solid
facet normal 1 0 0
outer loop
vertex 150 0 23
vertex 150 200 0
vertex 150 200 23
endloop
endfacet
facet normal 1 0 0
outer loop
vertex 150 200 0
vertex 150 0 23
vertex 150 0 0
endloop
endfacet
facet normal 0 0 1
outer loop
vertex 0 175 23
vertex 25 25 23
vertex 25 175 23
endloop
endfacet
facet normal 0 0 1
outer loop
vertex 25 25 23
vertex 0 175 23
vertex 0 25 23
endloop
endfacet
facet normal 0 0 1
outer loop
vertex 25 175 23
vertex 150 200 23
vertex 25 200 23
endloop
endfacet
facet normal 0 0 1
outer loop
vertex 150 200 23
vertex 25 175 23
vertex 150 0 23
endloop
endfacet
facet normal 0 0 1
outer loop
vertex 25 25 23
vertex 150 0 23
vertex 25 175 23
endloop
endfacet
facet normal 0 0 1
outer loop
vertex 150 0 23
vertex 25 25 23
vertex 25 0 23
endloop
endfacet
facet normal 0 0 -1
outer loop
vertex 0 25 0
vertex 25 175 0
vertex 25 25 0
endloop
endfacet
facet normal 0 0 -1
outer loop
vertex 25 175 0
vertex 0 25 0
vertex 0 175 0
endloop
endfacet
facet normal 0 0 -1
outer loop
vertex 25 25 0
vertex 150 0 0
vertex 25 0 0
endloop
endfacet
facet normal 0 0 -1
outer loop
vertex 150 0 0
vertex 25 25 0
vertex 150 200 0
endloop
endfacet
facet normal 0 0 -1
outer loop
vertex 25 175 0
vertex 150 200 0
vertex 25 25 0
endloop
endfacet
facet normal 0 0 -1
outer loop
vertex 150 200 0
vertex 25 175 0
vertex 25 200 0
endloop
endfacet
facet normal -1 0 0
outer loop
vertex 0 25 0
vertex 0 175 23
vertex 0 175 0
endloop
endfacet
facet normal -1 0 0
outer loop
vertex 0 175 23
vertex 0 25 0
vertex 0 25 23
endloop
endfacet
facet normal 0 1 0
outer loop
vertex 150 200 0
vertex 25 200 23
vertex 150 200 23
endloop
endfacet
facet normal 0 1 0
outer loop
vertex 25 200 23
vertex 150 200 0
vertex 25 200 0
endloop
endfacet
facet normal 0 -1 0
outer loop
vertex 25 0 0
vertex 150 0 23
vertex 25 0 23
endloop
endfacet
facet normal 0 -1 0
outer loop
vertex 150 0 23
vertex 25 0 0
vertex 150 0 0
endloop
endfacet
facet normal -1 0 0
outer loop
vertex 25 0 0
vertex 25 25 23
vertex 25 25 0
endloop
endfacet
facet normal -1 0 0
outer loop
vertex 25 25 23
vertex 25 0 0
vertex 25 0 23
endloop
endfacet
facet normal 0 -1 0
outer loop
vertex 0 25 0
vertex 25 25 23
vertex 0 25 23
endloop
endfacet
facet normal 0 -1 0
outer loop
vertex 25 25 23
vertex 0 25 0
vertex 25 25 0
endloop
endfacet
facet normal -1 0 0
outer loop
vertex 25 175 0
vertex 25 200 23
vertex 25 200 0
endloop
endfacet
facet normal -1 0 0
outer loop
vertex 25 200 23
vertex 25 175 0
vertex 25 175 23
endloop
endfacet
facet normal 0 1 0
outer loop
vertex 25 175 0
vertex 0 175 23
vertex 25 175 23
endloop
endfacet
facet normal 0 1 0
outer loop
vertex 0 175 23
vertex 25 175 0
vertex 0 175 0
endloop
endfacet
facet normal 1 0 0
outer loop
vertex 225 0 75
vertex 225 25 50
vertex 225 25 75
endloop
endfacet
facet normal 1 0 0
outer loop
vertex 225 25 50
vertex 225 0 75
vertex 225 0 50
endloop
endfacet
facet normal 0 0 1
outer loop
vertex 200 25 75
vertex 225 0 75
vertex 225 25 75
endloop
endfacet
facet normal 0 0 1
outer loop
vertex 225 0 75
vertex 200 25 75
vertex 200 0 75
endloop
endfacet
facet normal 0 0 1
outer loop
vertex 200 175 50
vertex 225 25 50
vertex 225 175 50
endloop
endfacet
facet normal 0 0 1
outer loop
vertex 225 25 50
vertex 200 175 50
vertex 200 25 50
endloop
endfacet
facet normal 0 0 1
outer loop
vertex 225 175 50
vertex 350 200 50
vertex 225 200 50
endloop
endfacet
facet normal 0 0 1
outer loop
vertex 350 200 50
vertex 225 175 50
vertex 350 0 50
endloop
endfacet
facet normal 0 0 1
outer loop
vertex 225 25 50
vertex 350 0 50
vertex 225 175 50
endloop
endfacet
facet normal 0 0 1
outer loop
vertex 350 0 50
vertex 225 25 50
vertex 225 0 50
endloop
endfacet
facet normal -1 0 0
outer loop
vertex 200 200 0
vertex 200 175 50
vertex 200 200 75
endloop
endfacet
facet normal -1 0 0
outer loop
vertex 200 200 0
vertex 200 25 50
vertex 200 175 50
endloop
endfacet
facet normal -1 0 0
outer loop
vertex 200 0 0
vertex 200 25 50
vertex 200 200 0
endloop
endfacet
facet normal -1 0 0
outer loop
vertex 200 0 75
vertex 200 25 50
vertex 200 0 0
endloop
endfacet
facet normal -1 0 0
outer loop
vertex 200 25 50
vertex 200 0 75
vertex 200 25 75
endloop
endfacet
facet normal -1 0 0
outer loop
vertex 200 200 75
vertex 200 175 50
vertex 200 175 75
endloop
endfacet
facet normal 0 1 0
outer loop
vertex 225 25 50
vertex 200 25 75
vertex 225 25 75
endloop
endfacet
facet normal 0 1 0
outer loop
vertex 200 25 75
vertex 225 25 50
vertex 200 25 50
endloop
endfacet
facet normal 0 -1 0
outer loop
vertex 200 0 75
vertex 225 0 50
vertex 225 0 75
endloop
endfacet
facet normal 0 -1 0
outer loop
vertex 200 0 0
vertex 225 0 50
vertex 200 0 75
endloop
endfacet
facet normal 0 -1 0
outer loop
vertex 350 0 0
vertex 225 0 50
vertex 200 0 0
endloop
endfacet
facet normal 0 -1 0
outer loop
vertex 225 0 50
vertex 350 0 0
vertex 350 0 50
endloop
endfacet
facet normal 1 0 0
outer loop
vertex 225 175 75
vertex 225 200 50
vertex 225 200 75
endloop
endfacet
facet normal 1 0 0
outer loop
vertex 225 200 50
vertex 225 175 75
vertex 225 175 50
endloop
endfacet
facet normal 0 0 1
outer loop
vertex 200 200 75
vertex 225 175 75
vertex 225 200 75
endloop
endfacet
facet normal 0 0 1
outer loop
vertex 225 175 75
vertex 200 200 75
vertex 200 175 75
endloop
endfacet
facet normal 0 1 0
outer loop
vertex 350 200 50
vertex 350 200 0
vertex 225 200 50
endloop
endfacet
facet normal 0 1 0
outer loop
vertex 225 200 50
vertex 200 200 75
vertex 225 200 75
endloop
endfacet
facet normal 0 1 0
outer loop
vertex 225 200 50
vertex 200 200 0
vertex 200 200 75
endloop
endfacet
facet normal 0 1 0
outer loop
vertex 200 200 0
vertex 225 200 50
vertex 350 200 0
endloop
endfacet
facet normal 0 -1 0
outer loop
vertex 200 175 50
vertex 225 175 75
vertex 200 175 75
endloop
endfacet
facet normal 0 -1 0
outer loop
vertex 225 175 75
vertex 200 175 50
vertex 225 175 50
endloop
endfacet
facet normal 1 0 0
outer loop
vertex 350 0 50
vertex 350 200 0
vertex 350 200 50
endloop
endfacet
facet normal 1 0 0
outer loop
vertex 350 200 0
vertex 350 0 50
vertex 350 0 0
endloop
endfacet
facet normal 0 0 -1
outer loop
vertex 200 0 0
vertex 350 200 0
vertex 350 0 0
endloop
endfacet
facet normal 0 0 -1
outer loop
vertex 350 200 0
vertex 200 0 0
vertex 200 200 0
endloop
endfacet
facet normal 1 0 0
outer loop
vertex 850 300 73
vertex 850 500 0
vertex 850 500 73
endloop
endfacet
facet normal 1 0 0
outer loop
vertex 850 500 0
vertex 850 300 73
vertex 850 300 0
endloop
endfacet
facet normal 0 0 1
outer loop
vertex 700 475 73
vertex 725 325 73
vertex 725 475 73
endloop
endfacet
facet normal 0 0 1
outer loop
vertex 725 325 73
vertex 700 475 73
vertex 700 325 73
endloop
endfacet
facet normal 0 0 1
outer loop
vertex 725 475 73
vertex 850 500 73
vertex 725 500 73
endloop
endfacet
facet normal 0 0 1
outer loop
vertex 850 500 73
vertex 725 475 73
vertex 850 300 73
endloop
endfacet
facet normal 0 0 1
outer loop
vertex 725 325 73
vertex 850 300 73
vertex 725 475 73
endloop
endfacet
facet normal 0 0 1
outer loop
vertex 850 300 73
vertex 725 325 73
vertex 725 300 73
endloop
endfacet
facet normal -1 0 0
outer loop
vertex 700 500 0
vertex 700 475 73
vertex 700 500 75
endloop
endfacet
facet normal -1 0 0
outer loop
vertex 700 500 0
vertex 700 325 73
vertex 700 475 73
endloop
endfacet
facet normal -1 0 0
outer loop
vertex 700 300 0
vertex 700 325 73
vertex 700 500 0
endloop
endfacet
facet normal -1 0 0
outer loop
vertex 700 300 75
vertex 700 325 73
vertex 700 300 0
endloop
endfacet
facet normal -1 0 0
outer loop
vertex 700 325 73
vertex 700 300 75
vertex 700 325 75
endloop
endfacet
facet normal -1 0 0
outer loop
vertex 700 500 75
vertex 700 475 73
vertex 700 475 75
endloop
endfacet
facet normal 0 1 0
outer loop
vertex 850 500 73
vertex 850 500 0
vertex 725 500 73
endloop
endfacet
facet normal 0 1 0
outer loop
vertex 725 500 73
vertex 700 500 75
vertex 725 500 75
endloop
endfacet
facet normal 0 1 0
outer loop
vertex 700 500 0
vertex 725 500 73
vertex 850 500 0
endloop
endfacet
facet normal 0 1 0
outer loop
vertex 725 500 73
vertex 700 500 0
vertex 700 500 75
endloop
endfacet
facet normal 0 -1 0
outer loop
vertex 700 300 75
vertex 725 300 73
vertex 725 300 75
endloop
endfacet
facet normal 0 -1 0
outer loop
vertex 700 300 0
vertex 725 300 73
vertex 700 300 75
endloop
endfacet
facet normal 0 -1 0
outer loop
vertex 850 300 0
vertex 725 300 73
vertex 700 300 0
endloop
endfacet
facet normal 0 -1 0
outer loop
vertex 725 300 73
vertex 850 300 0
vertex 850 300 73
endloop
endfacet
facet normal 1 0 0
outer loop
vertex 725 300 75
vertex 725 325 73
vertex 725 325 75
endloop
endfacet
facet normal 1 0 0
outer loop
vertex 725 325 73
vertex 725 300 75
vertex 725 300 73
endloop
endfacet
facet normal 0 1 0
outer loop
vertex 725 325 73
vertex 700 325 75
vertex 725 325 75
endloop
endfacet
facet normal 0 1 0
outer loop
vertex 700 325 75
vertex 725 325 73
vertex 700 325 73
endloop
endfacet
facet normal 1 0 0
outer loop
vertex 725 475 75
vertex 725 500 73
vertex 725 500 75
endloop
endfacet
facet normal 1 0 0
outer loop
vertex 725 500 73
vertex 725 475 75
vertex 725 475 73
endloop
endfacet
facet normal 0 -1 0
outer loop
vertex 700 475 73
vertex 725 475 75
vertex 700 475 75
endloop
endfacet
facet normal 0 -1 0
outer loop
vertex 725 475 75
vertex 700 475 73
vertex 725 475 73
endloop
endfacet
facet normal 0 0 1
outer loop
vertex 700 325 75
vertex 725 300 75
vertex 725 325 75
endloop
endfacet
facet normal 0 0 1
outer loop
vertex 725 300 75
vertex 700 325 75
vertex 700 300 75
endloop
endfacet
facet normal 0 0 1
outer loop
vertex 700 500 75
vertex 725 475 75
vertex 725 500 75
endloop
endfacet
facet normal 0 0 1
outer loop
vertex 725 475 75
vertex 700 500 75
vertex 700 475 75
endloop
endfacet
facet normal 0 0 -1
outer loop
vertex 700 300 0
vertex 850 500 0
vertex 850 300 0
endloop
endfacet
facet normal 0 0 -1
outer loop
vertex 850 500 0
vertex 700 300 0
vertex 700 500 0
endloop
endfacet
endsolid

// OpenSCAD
module lid() {
    difference() {
        cube([150,200,23]);
        cube([25,25,25]);
        translate([0,175,0]){
            cube([25,25,25]);
        }
    }
}

module body() {
    translate([200,0,0]) {
        cube([150,200,50]);
    }
    union(){
        translate([200,0,50]){
                cube([25,25,25]);
        }
        translate([200,175,50]){
                cube([25,25,25]);
        }
    }
}

lid();
body();

module laptop() {
    union() {
        translate([700,300,50]) {
            lid();
        }
        translate([500,300,0]) {
            body();
        }
    }
}

laptop();
